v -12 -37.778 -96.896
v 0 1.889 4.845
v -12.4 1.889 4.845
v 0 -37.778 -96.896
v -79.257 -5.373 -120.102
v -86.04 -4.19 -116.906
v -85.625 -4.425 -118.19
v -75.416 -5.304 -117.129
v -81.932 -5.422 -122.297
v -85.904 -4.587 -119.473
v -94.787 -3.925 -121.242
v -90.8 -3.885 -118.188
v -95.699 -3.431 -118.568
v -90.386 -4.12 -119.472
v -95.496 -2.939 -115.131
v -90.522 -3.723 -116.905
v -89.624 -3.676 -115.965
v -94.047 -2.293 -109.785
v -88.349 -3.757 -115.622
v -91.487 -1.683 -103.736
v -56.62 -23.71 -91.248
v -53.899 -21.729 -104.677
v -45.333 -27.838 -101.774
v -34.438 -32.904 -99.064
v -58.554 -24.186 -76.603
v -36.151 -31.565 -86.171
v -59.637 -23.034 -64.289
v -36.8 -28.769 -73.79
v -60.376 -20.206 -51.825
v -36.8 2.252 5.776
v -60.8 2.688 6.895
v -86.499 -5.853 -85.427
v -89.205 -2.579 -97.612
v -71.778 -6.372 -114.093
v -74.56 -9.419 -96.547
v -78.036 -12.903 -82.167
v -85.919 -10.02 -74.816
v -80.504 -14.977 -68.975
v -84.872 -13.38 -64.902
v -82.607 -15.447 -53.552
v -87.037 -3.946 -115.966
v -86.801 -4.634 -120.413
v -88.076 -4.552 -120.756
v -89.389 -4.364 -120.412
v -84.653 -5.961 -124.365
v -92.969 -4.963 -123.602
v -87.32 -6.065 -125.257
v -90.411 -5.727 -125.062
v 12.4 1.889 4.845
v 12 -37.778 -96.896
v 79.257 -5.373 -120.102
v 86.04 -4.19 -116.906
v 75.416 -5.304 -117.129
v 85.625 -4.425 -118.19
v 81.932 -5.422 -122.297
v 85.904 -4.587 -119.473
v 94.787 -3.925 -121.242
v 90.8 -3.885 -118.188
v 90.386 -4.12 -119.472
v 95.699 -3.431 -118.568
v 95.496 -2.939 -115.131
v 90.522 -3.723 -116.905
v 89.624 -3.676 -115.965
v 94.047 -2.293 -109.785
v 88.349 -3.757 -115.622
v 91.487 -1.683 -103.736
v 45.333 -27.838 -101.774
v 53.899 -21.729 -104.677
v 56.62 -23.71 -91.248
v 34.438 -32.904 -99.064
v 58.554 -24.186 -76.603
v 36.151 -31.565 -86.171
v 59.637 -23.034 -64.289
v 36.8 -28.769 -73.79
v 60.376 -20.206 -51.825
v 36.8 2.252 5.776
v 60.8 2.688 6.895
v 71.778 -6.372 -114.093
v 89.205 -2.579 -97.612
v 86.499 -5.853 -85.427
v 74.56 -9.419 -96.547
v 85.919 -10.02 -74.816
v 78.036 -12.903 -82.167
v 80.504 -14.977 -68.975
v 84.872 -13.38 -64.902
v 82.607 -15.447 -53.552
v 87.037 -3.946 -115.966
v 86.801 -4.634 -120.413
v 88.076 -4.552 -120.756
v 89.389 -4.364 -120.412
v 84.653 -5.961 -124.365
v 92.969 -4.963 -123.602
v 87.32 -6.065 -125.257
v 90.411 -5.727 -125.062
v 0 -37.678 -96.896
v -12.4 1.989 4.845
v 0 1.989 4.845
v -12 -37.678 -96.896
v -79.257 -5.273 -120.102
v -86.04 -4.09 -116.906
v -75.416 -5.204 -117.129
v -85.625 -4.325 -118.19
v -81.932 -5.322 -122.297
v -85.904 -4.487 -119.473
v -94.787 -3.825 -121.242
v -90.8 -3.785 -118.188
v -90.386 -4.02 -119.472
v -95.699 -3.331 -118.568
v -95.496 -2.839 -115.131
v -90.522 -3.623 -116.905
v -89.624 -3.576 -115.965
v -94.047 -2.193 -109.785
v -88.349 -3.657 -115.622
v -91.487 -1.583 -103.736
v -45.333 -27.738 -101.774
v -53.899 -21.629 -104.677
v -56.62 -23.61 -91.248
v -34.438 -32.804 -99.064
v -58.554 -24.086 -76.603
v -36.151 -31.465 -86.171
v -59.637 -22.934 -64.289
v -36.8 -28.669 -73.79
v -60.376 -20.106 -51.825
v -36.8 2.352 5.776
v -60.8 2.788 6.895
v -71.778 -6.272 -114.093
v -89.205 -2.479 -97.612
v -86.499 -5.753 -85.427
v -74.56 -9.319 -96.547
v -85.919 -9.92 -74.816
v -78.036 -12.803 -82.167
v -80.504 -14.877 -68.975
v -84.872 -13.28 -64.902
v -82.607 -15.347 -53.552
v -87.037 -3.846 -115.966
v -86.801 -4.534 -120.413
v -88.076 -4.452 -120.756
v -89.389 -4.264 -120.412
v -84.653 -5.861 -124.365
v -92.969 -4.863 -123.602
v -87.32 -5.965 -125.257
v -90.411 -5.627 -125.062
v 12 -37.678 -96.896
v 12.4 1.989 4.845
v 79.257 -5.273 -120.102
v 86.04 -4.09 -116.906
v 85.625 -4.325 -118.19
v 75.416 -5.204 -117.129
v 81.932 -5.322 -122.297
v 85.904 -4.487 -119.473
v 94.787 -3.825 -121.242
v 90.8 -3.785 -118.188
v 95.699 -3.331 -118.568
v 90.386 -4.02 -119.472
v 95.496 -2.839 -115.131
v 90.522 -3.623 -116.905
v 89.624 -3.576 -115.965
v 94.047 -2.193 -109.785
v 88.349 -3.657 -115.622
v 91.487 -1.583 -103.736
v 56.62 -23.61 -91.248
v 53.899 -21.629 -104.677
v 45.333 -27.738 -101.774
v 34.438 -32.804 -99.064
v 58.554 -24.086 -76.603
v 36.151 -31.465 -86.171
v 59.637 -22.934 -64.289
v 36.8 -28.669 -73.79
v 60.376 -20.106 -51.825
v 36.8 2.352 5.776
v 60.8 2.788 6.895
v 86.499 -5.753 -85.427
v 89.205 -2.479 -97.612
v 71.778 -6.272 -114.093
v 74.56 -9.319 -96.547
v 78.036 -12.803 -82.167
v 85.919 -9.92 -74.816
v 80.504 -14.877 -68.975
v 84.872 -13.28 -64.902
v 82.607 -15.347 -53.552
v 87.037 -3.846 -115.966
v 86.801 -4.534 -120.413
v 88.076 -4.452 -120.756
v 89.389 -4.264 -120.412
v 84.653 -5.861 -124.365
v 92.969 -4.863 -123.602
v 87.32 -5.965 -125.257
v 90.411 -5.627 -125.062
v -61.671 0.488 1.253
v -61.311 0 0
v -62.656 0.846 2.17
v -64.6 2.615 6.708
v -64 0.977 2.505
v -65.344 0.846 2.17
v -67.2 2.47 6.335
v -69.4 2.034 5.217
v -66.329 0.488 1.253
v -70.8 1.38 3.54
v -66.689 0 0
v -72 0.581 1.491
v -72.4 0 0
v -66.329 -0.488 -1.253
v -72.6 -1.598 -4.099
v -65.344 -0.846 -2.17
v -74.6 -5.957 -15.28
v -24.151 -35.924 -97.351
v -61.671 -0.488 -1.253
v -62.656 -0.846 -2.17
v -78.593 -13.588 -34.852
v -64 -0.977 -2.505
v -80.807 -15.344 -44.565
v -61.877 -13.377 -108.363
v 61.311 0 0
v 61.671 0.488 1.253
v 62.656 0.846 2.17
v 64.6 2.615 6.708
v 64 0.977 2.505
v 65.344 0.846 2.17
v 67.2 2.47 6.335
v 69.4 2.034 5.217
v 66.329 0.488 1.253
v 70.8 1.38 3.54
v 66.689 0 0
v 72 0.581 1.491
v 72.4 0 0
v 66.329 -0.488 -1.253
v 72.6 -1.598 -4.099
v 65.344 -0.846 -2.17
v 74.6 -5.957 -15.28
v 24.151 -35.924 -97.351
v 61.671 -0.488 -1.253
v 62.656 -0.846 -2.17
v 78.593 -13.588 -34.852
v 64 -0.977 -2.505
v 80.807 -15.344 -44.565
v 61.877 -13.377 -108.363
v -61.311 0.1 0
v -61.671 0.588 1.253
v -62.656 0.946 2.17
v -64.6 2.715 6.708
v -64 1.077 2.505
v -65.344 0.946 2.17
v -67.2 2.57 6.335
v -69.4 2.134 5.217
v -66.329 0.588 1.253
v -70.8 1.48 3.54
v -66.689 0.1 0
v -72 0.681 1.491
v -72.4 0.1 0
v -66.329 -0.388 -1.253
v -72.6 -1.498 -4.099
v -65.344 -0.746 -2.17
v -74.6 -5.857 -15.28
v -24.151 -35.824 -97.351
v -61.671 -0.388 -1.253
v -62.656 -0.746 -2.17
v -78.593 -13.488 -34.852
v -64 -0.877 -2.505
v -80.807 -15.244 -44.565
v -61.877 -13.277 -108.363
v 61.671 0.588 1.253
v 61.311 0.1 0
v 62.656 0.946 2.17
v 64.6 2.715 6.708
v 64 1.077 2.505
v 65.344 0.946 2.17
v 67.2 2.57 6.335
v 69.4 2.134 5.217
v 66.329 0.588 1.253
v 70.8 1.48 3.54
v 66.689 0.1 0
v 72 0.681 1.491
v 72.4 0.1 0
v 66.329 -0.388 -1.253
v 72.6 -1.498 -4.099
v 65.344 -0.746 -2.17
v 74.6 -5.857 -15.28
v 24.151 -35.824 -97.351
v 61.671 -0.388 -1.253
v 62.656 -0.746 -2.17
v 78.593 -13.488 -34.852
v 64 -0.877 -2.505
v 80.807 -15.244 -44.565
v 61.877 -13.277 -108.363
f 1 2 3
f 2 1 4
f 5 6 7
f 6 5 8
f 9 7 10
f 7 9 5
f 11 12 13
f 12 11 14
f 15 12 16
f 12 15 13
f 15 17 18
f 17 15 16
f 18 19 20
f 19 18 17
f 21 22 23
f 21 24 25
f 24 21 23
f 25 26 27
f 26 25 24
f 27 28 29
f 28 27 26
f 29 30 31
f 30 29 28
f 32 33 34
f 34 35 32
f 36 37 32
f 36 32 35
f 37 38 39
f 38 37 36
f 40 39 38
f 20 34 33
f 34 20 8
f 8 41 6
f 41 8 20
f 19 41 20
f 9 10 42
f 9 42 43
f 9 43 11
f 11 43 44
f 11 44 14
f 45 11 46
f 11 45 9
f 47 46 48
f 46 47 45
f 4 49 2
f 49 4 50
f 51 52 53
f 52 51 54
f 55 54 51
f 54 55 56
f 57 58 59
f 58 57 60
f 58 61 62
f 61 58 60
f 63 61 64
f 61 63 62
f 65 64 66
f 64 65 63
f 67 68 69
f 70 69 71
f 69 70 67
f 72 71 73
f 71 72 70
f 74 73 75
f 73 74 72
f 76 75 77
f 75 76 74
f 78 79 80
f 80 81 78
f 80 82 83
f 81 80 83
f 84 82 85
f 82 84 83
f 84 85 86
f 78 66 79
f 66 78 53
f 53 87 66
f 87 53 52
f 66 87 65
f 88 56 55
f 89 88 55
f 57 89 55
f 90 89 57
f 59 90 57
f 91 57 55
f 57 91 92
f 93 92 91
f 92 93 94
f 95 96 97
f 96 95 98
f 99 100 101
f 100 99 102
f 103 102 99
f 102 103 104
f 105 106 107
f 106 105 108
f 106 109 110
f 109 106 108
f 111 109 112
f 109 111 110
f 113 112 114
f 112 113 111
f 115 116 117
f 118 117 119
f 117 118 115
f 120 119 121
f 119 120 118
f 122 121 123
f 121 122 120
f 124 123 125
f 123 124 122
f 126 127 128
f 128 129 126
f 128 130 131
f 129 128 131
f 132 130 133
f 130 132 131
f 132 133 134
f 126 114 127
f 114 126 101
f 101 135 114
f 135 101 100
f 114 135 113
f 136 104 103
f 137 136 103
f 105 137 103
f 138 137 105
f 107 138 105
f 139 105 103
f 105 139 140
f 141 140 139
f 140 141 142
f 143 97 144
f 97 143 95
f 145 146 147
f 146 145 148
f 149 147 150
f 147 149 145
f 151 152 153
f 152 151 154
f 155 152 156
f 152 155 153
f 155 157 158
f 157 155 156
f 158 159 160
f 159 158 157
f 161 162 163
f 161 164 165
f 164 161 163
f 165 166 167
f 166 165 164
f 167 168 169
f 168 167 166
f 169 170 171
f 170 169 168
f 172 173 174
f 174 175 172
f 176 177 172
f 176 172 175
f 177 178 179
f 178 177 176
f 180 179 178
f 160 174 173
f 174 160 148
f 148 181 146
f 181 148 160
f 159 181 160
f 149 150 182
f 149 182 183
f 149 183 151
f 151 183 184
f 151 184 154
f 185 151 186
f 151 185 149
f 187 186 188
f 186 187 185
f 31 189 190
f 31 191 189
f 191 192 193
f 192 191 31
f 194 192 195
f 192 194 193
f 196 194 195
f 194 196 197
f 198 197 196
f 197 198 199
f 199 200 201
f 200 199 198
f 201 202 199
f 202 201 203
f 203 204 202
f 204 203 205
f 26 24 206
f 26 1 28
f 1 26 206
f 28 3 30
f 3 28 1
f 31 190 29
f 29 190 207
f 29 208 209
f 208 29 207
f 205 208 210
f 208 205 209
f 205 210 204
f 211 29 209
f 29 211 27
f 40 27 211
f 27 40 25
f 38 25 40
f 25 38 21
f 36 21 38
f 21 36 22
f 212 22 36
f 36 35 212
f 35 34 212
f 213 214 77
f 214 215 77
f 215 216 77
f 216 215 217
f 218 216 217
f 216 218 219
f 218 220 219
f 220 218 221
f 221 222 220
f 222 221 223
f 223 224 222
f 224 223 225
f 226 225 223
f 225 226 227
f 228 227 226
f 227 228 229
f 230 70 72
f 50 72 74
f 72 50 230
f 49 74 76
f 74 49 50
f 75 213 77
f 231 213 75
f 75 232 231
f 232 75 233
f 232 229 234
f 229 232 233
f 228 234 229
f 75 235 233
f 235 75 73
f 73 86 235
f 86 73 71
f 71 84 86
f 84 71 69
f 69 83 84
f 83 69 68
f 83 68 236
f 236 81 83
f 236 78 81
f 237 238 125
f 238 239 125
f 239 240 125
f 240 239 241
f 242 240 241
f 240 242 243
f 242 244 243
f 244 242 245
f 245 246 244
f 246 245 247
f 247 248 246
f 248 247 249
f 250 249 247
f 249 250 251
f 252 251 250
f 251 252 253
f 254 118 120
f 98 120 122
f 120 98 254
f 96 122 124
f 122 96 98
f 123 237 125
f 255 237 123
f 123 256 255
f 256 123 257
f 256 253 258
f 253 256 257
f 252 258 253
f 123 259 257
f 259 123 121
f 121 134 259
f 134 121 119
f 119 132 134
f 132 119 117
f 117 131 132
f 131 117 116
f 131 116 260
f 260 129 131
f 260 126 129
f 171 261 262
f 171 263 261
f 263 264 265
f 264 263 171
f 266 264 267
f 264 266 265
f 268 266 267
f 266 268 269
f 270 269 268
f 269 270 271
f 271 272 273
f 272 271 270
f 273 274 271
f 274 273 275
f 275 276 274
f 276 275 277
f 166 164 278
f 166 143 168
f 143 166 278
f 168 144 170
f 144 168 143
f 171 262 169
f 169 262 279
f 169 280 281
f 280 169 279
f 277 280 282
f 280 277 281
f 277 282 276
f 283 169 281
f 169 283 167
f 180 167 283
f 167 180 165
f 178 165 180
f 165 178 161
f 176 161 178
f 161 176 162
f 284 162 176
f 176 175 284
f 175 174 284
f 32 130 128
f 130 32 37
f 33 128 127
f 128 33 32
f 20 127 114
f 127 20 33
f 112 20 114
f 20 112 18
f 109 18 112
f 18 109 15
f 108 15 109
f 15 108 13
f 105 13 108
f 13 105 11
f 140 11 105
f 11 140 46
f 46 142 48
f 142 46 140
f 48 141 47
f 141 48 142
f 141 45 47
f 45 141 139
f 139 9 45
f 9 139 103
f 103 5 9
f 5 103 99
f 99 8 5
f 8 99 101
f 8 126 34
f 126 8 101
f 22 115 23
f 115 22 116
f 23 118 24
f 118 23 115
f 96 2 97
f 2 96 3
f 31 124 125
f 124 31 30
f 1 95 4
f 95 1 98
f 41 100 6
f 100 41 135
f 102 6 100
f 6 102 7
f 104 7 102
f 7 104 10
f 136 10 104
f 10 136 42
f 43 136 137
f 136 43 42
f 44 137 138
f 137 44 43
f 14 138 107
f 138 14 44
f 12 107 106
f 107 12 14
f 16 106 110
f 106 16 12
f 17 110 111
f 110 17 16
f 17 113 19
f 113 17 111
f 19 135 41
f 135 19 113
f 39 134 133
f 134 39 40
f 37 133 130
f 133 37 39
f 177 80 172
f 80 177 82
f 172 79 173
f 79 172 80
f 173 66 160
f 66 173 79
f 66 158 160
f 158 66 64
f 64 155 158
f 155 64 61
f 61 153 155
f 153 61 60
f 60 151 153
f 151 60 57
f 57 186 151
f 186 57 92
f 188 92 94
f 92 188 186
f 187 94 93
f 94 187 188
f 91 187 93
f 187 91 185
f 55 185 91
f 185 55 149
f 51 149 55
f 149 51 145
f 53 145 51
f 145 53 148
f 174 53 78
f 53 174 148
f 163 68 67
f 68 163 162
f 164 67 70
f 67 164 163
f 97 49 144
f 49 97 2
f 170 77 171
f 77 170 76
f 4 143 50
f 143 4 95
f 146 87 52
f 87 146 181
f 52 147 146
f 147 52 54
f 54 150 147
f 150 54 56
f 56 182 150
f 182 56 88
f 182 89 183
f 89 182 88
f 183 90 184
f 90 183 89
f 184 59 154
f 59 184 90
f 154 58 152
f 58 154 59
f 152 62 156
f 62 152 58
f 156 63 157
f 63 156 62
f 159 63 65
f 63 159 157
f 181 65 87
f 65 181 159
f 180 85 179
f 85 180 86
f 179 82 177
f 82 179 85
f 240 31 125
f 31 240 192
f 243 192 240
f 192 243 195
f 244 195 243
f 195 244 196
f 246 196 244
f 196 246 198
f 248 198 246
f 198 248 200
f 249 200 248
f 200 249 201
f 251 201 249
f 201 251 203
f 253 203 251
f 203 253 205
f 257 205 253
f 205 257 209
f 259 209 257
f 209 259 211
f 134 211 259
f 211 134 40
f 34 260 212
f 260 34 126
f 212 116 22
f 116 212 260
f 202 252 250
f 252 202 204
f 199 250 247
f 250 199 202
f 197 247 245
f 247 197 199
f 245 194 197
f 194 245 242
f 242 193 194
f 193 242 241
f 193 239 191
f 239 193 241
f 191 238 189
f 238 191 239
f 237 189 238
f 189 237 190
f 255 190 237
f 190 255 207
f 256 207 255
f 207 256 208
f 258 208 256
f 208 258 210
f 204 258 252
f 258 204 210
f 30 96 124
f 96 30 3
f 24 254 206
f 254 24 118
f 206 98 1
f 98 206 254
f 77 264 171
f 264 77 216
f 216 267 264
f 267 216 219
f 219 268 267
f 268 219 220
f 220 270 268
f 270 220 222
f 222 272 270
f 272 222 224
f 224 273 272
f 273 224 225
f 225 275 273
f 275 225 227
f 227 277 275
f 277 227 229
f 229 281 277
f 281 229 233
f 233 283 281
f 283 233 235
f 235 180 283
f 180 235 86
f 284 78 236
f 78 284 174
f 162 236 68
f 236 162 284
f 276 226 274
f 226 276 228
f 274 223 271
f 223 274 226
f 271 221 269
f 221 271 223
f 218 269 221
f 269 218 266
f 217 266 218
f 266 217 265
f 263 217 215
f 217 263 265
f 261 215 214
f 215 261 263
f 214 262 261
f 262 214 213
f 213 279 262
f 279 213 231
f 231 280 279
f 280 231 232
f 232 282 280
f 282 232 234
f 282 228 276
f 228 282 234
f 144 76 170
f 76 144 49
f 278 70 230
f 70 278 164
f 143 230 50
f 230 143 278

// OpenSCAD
use <../lib.scad>
use <s/u9494c01s01.scad>
use <s/u9494c01s02.scad>
use <s/u9494c01s03.scad>
use <s/u9494c01s04.scad>
function ldraw_lib__u9494p01c01() = [
// 0 Sail 27 x 17 Trapezoidal with Thick Stripes on White Background Pattern (Formed Shape 1)
// 0 Name: u9494p01c01.dat
// 0 Author: Philippe Hurbain [Philo]
// 0 !LDRAW_ORG Part UPDATE 2020-03
// 0 !LICENSE Licensed under CC BY 4.0 : see CAreadme.txt
// 
// 0 BFC CERTIFY CCW
  [0,"BFC","CERTIFY"],
  [0,"BFC","CCW"],
// 
// 0 !CATEGORY Sheet Fabric
// 0 !KEYWORDS Black Seas Barracuda, BrickLink sailbb22, Caribbean Clipper
// 0 !KEYWORDS Rebrickable upn0033pr0001, set 10040, Set 6274, set 6285
// 
// 0 !HISTORY 2020-12-29 [PTadmin] Official Update 2020-03
// 
// 
// 1 16 0 0 0 1 0 0 0 1 0 0 0 1 s\u9494c01s01.dat
  [1,16,0,0,0,1,0,0,0,1,0,0,0,1, ldraw_lib__s__u9494c01s01()],
// 1 16 0 0 0 -1 0 0 0 1 0 0 0 1 s\u9494c01s01.dat
  [1,16,0,0,0,-1,0,0,0,1,0,0,0,1, ldraw_lib__s__u9494c01s01()],
// 0 BFC INVERTNEXT
  [0,"BFC","INVERTNEXT"],
// 1 16 0 0 .25 1 0 0 0 1 0 0 0 1 s\u9494c01s01.dat
  [1,16,0,0,.25,1,0,0,0,1,0,0,0,1, ldraw_lib__s__u9494c01s01()],
// 0 BFC INVERTNEXT
  [0,"BFC","INVERTNEXT"],
// 1 16 0 0 .25 -1 0 0 0 1 0 0 0 1 s\u9494c01s01.dat
  [1,16,0,0,.25,-1,0,0,0,1,0,0,0,1, ldraw_lib__s__u9494c01s01()],
// 
// 1 15 0 0 0 1 0 0 0 1 0 0 0 1 s\u9494c01s02.dat
  [1,15,0,0,0,1,0,0,0,1,0,0,0,1, ldraw_lib__s__u9494c01s02()],
// 1 15 0 0 0 -1 0 0 0 1 0 0 0 1 s\u9494c01s02.dat
  [1,15,0,0,0,-1,0,0,0,1,0,0,0,1, ldraw_lib__s__u9494c01s02()],
// 0 BFC INVERTNEXT
  [0,"BFC","INVERTNEXT"],
// 1 15 0 0 .25 1 0 0 0 1 0 0 0 1 s\u9494c01s02.dat
  [1,15,0,0,.25,1,0,0,0,1,0,0,0,1, ldraw_lib__s__u9494c01s02()],
// 0 BFC INVERTNEXT
  [0,"BFC","INVERTNEXT"],
// 1 15 0 0 .25 -1 0 0 0 1 0 0 0 1 s\u9494c01s02.dat
  [1,15,0,0,.25,-1,0,0,0,1,0,0,0,1, ldraw_lib__s__u9494c01s02()],
// 
// 1 16 0 0 0 1 0 0 0 1 0 0 0 1 s\u9494c01s03.dat
  [1,16,0,0,0,1,0,0,0,1,0,0,0,1, ldraw_lib__s__u9494c01s03()],
// 1 16 0 0 0 -1 0 0 0 1 0 0 0 1 s\u9494c01s03.dat
  [1,16,0,0,0,-1,0,0,0,1,0,0,0,1, ldraw_lib__s__u9494c01s03()],
// 
// 1 15 0 0 0 1 0 0 0 1 0 0 0 1 s\u9494c01s04.dat
  [1,15,0,0,0,1,0,0,0,1,0,0,0,1, ldraw_lib__s__u9494c01s04()],
// 1 15 0 0 0 -1 0 0 0 1 0 0 0 1 s\u9494c01s04.dat
  [1,15,0,0,0,-1,0,0,0,1,0,0,0,1, ldraw_lib__s__u9494c01s04()],
];
module ldraw_lib__u9494p01c01(step=0, col=false, unit=2/5, alt=false, line=0.2, solid=!$preview)
    makepoly(ldraw_lib__u9494p01c01(), step=step, col=col, unit=unit, alt=alt, line=line, solid=solid);
ldraw_lib__u9494p01c01(line=0.2);
